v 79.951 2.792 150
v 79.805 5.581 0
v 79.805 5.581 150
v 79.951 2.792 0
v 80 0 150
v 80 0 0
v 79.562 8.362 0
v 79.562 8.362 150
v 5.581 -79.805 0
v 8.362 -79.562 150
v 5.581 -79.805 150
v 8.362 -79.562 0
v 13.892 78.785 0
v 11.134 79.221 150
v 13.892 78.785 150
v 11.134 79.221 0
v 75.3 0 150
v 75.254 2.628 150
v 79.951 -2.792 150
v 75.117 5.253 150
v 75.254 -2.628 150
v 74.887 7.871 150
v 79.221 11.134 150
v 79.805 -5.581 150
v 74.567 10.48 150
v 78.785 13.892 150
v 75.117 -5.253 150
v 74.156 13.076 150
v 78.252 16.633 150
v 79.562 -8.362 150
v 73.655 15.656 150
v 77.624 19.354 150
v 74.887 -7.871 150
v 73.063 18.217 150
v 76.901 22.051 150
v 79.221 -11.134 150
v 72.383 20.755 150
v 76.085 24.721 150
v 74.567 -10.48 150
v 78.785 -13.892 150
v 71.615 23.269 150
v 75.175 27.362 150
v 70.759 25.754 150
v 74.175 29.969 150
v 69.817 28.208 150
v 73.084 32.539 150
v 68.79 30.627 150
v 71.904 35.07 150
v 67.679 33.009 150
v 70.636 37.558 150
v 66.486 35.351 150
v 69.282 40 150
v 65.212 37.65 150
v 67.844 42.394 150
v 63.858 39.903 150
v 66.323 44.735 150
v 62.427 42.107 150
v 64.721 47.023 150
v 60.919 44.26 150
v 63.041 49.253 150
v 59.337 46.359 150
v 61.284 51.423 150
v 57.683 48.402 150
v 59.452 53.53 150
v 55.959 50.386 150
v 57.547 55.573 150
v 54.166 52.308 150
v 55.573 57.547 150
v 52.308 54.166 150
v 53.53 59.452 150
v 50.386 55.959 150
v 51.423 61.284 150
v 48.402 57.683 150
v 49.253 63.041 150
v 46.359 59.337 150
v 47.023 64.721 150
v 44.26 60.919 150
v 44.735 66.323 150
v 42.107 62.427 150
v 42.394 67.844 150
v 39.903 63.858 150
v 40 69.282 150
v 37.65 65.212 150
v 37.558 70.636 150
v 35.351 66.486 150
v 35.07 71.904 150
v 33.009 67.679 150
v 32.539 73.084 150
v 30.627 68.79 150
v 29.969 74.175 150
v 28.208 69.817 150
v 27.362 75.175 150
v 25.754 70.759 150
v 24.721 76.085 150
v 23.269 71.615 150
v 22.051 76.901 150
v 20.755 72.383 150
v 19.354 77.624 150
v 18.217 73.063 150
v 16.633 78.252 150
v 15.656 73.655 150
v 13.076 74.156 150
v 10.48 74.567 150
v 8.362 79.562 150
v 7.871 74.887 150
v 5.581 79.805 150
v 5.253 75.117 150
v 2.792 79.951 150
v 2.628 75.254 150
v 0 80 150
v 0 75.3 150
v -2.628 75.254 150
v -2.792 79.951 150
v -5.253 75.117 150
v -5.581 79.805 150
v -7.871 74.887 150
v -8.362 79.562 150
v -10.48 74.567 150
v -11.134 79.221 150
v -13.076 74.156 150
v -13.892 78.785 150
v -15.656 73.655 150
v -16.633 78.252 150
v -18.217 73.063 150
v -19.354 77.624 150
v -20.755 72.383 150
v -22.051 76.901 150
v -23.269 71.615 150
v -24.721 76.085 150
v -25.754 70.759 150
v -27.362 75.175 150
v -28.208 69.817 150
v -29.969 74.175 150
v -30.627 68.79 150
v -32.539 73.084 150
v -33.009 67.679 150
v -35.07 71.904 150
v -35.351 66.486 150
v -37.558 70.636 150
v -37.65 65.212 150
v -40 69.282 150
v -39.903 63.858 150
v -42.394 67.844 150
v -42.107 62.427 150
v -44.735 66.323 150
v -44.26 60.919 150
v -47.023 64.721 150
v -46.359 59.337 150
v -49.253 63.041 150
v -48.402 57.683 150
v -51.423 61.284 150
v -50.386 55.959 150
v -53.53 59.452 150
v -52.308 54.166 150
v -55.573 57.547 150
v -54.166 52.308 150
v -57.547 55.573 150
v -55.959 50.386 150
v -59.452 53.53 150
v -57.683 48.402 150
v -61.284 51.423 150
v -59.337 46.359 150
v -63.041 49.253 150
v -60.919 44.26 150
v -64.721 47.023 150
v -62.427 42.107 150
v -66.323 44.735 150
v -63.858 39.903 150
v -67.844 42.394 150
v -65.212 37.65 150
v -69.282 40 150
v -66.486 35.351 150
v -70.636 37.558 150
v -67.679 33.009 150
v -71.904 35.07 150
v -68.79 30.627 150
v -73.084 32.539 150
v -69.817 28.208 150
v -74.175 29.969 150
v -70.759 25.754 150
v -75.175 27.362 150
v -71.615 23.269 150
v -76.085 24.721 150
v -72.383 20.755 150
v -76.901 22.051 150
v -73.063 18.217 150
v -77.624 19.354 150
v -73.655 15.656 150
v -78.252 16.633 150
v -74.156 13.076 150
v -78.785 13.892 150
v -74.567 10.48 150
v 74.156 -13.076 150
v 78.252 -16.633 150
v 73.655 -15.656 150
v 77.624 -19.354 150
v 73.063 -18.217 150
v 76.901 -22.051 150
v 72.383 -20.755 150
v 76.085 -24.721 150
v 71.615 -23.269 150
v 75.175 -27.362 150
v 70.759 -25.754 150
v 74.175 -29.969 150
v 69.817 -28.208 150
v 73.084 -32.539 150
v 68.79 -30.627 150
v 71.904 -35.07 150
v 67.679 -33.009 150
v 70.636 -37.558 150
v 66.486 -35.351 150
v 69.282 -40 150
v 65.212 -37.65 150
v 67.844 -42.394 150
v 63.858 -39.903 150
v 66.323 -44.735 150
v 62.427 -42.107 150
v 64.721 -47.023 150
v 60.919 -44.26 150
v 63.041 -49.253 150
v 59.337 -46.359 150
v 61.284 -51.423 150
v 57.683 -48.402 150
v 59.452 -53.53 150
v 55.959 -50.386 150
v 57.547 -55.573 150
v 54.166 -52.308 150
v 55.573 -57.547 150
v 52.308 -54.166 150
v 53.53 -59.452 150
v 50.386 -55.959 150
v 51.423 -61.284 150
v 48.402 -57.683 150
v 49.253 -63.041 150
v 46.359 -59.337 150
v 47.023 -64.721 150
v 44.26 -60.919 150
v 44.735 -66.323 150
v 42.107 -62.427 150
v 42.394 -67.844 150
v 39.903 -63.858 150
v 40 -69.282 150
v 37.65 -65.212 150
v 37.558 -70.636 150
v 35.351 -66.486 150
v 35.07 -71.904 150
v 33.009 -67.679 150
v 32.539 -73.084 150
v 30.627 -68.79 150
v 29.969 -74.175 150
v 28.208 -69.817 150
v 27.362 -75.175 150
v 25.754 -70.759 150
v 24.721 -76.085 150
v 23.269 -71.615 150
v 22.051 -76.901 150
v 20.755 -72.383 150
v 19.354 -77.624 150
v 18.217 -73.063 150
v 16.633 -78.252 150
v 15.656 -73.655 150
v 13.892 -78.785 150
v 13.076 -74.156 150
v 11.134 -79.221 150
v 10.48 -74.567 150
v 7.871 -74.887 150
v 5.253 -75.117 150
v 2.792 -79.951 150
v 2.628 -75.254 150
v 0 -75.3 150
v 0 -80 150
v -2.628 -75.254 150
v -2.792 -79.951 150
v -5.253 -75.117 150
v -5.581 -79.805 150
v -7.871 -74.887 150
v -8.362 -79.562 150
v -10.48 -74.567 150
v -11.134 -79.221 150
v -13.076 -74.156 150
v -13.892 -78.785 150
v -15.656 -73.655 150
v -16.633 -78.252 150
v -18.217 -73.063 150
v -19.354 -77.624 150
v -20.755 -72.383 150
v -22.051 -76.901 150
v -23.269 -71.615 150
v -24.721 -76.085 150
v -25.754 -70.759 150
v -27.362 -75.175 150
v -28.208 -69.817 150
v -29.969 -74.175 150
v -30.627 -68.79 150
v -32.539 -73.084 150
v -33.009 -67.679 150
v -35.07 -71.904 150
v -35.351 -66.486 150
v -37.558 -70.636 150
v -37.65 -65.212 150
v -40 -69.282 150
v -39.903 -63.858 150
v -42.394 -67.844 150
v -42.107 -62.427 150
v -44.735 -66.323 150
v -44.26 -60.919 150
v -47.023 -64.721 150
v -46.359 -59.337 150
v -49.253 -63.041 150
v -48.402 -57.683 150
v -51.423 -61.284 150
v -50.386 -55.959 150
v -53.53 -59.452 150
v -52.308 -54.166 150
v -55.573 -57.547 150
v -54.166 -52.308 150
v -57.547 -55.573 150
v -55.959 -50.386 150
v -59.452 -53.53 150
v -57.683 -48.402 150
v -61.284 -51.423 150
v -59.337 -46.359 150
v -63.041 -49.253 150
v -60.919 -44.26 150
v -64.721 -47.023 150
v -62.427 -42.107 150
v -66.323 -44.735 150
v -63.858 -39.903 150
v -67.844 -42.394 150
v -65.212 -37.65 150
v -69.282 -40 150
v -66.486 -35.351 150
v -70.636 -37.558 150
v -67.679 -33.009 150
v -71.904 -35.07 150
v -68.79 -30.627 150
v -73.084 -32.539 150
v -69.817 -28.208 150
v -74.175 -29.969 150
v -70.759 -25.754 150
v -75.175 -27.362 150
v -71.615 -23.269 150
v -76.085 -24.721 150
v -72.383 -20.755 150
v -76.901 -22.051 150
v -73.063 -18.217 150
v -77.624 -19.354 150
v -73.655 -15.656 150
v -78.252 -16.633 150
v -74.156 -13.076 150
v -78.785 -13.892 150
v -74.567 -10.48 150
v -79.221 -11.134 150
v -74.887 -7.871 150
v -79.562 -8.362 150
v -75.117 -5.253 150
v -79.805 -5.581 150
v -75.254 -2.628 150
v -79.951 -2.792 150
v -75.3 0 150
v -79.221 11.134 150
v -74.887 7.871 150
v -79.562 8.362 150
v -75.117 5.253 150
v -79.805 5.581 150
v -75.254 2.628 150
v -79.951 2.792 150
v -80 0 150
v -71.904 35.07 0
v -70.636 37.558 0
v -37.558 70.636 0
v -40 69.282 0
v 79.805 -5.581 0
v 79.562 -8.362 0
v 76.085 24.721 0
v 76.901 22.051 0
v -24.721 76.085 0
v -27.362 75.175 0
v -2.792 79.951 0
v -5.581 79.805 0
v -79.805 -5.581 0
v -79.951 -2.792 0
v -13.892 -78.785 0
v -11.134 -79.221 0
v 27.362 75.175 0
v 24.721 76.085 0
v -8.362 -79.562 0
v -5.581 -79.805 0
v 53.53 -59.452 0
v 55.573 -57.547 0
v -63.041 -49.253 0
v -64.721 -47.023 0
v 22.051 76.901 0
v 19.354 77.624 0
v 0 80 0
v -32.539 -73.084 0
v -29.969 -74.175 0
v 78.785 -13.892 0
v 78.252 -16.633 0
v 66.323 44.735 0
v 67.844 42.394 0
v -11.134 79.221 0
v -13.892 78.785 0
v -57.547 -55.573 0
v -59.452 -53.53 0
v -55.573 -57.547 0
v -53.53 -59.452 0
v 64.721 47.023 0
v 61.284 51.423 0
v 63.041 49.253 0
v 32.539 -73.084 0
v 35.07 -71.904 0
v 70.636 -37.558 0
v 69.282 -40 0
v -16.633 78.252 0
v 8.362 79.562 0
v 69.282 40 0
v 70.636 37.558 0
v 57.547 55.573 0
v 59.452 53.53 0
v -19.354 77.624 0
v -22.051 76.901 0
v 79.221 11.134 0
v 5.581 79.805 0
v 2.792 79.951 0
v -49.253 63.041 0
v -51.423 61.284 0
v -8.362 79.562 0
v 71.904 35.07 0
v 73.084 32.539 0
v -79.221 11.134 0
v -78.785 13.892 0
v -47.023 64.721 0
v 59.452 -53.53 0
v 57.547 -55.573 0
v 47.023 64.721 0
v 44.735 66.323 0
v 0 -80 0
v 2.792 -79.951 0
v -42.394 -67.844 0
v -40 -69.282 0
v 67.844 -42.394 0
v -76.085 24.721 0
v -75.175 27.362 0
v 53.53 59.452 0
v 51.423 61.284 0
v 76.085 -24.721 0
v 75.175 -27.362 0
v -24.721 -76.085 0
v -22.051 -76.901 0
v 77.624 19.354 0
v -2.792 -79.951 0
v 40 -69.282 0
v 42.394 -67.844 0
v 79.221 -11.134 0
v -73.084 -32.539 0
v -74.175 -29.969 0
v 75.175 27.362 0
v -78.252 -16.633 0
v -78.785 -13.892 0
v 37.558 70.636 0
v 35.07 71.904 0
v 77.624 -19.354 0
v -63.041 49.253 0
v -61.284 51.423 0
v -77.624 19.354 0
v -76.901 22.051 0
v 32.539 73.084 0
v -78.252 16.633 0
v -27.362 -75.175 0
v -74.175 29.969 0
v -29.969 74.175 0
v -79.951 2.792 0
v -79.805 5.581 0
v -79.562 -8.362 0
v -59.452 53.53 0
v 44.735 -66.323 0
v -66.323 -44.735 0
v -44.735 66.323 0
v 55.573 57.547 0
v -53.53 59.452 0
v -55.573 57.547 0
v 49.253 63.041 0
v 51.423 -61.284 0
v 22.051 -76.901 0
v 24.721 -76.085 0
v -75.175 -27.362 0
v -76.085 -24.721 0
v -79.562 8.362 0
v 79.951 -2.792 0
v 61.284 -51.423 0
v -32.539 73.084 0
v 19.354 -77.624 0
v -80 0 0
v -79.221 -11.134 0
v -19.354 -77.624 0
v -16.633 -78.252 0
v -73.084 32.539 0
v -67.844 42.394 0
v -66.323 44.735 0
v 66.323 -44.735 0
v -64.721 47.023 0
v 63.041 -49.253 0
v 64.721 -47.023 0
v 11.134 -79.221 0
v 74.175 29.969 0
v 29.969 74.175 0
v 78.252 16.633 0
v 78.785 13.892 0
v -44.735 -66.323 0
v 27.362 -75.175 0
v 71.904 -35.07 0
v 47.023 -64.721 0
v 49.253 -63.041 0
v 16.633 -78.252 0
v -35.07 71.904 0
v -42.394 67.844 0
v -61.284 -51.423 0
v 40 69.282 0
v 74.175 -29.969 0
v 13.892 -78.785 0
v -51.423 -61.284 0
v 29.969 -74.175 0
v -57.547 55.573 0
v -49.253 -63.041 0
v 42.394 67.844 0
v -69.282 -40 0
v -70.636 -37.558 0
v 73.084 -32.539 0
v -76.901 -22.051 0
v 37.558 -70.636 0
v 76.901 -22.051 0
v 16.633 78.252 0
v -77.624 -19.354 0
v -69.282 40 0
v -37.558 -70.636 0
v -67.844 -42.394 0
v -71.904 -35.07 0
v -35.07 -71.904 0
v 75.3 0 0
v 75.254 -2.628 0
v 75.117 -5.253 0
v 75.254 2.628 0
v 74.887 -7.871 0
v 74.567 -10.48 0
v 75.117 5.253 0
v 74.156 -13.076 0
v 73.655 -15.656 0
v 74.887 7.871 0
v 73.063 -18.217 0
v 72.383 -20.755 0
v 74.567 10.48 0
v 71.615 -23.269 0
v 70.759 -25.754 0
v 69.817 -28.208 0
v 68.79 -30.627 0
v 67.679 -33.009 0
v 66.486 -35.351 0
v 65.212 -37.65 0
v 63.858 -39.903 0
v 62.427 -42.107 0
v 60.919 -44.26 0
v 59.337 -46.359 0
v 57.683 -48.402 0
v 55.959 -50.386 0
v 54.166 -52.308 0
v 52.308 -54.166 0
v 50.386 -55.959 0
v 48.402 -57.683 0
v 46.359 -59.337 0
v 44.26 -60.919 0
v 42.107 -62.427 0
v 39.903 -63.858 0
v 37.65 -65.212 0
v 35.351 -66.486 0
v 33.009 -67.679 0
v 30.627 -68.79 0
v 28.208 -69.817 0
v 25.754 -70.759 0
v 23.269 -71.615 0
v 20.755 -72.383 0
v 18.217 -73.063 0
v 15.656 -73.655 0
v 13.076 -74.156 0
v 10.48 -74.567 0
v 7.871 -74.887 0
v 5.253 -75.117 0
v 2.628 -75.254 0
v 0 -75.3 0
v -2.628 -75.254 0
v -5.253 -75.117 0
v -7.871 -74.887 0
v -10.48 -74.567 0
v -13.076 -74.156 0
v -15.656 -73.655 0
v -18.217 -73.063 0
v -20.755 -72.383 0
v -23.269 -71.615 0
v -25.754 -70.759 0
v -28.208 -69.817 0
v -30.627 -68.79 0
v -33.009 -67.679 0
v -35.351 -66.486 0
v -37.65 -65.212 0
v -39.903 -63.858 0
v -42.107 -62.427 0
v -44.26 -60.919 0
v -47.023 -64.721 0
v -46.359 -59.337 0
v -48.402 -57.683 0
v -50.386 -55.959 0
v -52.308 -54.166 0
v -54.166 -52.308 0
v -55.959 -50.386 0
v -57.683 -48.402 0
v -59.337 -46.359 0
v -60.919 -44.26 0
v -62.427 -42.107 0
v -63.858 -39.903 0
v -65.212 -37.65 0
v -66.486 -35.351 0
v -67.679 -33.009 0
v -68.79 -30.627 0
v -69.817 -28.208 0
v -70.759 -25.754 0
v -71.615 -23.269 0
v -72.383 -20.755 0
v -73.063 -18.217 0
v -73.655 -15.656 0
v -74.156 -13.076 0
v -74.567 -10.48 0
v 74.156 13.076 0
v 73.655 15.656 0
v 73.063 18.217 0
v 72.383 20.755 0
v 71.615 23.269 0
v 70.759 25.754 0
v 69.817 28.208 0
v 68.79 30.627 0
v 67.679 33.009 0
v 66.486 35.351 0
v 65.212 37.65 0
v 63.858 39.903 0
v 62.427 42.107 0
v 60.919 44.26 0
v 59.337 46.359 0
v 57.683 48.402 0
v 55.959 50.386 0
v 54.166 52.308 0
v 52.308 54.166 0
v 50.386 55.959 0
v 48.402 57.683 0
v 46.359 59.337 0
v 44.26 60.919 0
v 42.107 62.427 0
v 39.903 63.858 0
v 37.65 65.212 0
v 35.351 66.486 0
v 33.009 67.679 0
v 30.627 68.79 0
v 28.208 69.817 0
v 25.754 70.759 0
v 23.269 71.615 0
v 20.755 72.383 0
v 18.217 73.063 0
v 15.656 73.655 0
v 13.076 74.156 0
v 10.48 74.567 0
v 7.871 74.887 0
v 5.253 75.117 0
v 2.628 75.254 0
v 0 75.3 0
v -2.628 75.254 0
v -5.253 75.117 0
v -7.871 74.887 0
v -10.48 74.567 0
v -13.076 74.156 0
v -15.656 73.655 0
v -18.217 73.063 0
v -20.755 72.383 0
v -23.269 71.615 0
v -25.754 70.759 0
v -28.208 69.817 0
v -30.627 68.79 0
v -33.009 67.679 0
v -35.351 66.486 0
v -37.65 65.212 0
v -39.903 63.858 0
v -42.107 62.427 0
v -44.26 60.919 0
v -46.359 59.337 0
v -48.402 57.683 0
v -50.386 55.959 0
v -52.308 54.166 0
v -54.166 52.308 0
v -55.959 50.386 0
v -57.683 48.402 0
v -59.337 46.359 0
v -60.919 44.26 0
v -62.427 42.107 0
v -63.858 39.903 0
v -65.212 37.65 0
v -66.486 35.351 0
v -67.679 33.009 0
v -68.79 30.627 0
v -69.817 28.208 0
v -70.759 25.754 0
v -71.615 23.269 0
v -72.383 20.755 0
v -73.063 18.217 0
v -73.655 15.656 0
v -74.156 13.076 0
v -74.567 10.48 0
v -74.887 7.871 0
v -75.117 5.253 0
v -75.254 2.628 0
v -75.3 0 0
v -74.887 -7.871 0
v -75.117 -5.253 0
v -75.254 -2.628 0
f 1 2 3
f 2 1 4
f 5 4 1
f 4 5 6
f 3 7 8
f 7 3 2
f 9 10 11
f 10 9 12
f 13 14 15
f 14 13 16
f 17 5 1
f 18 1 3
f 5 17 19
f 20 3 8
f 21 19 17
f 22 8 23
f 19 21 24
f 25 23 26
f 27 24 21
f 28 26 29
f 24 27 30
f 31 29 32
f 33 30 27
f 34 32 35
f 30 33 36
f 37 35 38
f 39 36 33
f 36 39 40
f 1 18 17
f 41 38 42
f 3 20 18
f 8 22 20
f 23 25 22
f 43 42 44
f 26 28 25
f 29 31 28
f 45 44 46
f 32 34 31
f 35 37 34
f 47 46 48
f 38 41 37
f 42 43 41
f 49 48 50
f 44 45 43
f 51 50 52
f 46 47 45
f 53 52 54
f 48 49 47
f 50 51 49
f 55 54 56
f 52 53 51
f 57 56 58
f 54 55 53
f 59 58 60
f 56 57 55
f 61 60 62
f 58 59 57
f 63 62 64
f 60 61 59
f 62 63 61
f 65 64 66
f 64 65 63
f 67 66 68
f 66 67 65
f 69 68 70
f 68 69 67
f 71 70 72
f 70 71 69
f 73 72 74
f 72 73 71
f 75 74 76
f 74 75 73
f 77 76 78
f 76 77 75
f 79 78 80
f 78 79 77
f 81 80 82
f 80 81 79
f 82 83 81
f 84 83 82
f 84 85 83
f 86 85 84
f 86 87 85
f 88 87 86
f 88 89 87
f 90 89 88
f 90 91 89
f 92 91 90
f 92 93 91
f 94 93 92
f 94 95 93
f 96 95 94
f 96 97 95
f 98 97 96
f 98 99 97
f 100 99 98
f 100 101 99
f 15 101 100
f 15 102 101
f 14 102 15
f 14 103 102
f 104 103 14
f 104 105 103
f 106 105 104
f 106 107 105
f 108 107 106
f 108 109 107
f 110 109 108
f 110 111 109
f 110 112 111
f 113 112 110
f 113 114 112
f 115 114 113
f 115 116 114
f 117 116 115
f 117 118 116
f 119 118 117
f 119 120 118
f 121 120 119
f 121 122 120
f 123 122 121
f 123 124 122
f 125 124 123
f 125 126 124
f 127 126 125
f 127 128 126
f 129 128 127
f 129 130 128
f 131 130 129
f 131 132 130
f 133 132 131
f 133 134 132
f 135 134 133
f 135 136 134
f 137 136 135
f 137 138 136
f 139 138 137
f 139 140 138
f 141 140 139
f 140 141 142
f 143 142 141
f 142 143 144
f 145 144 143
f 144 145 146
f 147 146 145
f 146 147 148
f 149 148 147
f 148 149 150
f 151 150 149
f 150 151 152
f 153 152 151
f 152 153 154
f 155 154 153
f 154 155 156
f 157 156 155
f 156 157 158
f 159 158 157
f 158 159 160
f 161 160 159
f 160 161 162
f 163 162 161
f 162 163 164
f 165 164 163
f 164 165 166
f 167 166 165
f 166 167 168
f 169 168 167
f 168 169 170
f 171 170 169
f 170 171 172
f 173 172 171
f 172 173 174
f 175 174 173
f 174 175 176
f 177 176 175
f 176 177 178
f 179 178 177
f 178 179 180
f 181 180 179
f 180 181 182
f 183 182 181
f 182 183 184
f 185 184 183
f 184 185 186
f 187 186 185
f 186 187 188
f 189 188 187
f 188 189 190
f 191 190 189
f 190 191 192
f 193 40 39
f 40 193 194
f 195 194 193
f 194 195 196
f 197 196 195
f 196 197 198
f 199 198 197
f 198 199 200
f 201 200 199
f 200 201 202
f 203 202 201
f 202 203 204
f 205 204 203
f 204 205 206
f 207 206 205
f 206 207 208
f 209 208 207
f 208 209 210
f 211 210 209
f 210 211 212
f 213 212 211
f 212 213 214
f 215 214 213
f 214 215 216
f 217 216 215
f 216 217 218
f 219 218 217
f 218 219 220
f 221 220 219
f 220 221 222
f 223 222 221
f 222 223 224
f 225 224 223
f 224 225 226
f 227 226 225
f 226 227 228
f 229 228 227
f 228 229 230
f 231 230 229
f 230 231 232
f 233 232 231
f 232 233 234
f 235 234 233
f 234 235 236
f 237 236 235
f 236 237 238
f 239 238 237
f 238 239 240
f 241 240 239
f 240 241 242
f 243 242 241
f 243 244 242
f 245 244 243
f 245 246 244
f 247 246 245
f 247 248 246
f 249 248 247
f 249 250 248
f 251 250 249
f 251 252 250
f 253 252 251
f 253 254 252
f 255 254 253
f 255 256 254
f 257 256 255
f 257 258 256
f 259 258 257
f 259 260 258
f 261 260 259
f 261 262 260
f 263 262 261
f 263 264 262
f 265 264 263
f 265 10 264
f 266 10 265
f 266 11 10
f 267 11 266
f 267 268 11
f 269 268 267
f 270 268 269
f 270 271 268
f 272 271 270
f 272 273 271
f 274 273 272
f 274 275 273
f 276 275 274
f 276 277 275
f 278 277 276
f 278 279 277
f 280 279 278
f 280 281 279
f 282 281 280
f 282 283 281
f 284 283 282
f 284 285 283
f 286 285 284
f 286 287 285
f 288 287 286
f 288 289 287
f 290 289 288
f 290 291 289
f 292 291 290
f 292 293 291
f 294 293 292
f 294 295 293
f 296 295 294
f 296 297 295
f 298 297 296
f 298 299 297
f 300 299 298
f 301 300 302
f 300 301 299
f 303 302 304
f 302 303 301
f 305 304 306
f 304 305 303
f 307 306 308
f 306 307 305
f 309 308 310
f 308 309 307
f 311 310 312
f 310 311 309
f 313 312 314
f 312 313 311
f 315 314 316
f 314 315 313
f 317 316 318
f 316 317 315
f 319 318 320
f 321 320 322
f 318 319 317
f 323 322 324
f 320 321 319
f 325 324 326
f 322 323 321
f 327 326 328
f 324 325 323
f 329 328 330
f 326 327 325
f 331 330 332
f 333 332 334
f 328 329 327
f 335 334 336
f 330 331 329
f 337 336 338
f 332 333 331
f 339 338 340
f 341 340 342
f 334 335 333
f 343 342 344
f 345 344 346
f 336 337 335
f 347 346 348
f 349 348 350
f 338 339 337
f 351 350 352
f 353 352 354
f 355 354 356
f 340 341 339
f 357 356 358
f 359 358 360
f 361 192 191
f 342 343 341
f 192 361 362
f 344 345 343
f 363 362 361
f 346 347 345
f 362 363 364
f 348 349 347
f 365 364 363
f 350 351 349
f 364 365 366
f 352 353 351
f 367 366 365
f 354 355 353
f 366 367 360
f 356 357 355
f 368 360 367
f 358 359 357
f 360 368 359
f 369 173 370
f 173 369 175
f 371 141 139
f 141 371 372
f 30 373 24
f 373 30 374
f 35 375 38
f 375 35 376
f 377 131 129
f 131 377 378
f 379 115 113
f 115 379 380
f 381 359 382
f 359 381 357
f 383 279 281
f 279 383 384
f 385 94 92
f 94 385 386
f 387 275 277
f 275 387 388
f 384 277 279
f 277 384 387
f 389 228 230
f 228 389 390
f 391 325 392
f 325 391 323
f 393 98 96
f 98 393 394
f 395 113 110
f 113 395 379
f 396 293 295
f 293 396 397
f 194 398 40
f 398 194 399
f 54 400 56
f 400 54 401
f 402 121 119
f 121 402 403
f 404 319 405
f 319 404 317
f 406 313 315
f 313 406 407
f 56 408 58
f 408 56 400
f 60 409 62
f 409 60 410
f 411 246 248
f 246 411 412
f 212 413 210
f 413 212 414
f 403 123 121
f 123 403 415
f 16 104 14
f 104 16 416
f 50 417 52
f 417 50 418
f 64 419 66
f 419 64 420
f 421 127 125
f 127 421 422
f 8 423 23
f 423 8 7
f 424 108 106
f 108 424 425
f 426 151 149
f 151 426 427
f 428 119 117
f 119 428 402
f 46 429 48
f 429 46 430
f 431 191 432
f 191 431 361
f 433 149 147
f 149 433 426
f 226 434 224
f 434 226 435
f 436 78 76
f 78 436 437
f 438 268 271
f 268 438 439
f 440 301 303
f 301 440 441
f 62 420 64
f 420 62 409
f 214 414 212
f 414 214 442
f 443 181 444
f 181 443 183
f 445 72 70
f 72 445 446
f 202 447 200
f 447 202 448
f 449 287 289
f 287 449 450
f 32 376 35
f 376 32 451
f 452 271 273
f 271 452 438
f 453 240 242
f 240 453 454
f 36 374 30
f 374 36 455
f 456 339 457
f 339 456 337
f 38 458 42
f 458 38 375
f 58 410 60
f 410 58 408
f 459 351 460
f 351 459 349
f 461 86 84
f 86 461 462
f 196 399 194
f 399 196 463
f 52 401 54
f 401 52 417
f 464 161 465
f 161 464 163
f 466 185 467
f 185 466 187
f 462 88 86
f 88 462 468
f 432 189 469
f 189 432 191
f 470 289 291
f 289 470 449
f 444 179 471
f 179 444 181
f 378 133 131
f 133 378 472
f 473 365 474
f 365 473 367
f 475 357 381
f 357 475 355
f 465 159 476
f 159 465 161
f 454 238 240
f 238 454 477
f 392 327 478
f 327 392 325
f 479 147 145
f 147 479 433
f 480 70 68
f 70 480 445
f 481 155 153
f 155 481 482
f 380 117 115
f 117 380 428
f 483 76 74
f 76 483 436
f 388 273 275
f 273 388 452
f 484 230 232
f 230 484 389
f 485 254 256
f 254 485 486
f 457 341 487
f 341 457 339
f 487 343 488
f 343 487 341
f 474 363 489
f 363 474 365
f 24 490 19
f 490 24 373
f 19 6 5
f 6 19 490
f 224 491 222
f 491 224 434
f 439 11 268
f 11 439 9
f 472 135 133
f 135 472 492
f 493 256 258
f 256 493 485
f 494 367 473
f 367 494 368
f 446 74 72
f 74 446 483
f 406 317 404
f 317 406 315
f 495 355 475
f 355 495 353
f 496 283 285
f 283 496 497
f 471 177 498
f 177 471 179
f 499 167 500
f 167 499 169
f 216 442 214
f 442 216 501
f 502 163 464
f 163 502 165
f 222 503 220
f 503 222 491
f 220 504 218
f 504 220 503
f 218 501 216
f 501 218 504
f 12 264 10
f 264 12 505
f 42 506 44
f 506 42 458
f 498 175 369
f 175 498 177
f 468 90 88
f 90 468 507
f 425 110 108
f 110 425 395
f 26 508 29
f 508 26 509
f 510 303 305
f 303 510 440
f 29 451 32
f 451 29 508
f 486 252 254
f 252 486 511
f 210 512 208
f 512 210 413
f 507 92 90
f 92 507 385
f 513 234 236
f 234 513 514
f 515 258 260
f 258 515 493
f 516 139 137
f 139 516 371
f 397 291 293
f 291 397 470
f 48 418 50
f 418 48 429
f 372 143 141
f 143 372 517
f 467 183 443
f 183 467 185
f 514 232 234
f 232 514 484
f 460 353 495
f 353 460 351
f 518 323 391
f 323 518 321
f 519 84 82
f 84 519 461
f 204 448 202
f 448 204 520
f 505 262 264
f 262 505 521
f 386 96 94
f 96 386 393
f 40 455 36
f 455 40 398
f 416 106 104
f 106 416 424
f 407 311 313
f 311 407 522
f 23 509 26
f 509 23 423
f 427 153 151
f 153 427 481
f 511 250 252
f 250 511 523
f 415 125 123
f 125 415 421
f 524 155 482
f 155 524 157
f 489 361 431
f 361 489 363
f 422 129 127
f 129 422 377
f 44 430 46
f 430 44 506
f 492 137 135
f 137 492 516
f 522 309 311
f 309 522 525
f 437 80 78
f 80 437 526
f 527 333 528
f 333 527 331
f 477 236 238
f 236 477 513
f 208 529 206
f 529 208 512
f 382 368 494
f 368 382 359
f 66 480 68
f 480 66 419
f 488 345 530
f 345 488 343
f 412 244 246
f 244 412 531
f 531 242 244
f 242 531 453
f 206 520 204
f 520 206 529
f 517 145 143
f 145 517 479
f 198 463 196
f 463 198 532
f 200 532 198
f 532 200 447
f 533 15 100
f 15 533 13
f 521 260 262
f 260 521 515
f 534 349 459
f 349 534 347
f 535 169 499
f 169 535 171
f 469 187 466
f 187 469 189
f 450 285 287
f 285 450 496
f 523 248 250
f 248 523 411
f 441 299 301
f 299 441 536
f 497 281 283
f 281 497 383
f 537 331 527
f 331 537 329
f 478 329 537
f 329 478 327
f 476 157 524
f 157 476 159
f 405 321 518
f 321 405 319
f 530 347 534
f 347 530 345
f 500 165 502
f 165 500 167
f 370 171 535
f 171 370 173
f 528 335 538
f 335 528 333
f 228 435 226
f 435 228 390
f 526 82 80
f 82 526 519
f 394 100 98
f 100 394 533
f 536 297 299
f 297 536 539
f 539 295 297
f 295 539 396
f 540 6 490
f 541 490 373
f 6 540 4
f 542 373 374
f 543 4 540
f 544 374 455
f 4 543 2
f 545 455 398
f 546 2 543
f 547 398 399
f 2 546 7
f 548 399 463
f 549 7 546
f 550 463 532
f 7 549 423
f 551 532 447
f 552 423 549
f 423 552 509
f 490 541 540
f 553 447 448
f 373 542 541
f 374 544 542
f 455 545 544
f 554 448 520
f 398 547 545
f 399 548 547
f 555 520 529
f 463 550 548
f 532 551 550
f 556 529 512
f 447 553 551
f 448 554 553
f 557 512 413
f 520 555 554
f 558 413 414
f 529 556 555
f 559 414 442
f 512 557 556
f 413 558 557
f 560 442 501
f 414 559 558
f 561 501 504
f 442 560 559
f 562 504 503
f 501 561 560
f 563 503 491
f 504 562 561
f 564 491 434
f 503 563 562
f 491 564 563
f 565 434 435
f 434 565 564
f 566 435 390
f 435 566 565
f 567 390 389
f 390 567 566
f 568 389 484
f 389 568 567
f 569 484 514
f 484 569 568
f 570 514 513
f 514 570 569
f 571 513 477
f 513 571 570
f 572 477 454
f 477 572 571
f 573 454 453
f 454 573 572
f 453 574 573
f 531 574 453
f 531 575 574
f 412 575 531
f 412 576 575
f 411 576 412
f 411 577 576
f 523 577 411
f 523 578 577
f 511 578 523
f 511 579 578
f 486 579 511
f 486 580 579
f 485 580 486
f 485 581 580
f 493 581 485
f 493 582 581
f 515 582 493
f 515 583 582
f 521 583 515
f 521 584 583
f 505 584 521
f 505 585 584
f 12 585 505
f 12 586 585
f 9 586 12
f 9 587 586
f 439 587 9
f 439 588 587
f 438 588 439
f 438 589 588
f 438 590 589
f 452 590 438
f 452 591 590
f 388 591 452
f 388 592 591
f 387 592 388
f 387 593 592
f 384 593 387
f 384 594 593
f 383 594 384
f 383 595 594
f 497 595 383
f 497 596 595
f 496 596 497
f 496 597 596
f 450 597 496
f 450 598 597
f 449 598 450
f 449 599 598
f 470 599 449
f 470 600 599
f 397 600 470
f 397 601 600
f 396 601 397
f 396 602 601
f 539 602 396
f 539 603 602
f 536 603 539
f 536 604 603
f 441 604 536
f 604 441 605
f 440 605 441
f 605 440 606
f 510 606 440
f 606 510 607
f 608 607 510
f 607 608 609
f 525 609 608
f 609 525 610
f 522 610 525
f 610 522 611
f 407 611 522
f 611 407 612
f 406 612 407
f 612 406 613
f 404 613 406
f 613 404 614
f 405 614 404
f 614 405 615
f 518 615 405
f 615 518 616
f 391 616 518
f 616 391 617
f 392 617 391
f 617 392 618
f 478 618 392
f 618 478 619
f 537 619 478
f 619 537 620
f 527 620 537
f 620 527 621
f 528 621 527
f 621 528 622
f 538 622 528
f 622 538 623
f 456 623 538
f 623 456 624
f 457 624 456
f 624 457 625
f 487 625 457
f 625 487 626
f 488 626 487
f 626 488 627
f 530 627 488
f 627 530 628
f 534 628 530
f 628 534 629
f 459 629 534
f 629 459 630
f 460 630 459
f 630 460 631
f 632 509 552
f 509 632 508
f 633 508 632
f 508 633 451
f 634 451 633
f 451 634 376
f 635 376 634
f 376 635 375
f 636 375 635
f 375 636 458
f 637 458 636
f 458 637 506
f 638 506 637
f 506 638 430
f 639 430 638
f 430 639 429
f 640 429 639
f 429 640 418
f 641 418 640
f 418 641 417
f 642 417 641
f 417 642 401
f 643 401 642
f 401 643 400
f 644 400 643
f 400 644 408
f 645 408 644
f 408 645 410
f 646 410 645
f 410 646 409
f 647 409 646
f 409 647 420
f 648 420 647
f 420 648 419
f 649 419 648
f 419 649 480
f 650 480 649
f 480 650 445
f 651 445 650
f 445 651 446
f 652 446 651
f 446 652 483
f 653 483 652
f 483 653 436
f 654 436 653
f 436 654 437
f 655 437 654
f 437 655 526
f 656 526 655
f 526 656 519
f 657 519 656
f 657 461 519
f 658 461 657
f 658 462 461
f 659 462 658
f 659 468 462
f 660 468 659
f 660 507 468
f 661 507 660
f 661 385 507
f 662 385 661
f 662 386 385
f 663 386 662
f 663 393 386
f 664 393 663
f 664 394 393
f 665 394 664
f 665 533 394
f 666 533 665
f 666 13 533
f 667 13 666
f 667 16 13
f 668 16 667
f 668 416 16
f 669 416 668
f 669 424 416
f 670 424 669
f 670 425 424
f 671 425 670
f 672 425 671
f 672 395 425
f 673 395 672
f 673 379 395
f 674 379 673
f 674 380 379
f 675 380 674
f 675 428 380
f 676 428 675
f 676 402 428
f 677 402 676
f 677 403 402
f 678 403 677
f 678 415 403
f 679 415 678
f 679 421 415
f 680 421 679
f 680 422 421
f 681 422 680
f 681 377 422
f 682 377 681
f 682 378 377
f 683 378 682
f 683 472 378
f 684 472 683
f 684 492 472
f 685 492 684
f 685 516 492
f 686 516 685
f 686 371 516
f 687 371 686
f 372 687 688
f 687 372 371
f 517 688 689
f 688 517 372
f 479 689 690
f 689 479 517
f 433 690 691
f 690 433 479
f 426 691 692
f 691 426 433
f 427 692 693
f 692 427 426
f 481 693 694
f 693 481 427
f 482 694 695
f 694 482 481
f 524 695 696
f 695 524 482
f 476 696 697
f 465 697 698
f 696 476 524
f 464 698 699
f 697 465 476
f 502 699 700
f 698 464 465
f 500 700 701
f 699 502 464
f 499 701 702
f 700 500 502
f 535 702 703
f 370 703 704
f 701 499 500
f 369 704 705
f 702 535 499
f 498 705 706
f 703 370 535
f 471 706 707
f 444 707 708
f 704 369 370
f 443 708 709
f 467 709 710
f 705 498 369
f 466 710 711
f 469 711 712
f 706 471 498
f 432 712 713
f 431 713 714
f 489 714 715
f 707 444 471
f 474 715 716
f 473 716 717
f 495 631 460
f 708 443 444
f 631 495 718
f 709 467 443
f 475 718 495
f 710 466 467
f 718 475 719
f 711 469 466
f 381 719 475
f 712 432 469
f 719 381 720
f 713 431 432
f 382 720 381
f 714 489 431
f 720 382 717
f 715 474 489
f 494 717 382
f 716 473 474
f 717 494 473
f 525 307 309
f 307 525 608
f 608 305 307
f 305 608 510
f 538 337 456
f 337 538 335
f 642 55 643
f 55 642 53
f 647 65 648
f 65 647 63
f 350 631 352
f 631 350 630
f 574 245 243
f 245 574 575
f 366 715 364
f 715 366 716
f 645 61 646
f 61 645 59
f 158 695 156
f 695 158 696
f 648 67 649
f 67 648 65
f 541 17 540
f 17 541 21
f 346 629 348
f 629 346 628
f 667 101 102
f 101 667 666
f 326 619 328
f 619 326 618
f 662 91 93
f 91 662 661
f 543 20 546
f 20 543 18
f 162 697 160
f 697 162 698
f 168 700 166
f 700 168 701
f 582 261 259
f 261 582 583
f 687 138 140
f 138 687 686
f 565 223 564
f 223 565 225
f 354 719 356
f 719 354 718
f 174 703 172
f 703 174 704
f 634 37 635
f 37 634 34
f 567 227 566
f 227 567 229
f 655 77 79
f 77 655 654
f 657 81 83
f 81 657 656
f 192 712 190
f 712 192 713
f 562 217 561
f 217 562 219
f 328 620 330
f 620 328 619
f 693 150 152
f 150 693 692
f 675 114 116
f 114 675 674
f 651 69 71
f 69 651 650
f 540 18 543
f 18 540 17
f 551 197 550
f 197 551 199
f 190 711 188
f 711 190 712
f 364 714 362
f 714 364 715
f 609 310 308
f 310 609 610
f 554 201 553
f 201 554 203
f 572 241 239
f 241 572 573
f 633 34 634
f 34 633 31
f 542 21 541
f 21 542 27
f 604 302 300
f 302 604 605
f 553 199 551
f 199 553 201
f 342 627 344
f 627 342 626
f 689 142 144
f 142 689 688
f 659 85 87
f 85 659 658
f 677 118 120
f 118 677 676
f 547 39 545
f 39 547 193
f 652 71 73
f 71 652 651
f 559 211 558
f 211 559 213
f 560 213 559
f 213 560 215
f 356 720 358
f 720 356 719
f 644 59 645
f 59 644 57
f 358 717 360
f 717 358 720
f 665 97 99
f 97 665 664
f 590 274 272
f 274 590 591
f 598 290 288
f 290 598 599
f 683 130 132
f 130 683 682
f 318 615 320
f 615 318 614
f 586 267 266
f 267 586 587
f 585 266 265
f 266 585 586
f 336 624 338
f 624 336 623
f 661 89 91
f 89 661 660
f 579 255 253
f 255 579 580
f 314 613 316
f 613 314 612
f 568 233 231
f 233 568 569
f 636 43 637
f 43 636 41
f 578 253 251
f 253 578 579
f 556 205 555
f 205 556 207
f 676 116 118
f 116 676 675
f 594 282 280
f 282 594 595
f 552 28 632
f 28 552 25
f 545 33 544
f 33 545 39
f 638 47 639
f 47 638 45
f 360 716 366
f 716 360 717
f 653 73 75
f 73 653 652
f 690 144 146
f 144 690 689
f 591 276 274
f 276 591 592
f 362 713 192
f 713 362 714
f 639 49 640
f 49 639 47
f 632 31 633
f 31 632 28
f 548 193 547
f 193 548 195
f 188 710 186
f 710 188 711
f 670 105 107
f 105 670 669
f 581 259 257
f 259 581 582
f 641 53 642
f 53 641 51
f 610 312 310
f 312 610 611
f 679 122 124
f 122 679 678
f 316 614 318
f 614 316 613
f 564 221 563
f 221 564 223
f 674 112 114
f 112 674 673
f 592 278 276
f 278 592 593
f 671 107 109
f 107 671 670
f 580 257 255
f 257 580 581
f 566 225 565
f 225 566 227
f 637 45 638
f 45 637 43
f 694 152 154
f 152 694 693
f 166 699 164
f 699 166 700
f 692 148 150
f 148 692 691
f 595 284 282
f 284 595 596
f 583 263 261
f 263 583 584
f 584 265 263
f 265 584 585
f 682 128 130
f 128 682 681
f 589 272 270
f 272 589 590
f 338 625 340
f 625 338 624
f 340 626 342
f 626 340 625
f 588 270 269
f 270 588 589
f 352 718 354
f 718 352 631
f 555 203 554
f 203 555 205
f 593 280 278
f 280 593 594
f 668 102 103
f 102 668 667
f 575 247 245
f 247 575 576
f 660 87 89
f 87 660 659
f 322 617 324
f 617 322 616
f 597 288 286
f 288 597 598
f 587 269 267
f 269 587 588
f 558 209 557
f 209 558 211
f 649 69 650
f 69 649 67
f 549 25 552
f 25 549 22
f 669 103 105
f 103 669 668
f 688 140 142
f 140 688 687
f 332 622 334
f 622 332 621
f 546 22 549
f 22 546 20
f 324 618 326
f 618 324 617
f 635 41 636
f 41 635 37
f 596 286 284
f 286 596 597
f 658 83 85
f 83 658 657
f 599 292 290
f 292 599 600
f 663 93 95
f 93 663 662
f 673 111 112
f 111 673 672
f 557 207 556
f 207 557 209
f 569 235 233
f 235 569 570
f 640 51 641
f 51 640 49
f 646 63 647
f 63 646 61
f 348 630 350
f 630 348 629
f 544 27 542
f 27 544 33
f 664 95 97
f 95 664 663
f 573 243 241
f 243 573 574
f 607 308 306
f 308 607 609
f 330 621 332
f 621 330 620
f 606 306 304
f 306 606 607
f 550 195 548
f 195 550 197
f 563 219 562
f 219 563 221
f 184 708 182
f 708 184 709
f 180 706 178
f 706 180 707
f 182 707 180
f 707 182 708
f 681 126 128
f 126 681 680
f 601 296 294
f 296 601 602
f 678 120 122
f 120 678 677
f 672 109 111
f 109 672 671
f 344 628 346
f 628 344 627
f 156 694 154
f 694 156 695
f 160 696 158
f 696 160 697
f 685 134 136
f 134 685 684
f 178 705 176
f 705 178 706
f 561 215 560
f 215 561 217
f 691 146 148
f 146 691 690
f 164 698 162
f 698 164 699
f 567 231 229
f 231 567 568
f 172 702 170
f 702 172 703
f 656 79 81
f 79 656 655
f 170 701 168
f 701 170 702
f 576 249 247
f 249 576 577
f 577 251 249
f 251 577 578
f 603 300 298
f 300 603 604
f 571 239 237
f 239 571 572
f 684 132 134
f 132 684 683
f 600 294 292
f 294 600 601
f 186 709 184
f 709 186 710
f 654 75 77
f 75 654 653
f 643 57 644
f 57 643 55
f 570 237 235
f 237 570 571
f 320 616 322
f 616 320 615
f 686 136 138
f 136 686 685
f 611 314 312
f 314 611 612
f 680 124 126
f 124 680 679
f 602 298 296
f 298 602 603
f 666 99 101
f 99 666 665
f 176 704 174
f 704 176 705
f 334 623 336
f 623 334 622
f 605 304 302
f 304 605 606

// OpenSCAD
$fn = 180;

// HT pipe (approximation)
// "HT 160" interpreted as nominal OD ~160 mm
// "150 mm" interpreted as pipe length
od = 160;          // outer diameter (mm)
wall = 4.7;        // typical HT/SML-like wall thickness approximation (mm)
id = od - 2*wall;  // inner diameter (mm)
len = 150;         // length (mm)

module ht_pipe(od, id, len){
    difference(){
        cylinder(h=len, d=od);
        translate([0,0,-0.5])
            cylinder(h=len+1, d=id);
    }
}

ht_pipe(od, id, len);
